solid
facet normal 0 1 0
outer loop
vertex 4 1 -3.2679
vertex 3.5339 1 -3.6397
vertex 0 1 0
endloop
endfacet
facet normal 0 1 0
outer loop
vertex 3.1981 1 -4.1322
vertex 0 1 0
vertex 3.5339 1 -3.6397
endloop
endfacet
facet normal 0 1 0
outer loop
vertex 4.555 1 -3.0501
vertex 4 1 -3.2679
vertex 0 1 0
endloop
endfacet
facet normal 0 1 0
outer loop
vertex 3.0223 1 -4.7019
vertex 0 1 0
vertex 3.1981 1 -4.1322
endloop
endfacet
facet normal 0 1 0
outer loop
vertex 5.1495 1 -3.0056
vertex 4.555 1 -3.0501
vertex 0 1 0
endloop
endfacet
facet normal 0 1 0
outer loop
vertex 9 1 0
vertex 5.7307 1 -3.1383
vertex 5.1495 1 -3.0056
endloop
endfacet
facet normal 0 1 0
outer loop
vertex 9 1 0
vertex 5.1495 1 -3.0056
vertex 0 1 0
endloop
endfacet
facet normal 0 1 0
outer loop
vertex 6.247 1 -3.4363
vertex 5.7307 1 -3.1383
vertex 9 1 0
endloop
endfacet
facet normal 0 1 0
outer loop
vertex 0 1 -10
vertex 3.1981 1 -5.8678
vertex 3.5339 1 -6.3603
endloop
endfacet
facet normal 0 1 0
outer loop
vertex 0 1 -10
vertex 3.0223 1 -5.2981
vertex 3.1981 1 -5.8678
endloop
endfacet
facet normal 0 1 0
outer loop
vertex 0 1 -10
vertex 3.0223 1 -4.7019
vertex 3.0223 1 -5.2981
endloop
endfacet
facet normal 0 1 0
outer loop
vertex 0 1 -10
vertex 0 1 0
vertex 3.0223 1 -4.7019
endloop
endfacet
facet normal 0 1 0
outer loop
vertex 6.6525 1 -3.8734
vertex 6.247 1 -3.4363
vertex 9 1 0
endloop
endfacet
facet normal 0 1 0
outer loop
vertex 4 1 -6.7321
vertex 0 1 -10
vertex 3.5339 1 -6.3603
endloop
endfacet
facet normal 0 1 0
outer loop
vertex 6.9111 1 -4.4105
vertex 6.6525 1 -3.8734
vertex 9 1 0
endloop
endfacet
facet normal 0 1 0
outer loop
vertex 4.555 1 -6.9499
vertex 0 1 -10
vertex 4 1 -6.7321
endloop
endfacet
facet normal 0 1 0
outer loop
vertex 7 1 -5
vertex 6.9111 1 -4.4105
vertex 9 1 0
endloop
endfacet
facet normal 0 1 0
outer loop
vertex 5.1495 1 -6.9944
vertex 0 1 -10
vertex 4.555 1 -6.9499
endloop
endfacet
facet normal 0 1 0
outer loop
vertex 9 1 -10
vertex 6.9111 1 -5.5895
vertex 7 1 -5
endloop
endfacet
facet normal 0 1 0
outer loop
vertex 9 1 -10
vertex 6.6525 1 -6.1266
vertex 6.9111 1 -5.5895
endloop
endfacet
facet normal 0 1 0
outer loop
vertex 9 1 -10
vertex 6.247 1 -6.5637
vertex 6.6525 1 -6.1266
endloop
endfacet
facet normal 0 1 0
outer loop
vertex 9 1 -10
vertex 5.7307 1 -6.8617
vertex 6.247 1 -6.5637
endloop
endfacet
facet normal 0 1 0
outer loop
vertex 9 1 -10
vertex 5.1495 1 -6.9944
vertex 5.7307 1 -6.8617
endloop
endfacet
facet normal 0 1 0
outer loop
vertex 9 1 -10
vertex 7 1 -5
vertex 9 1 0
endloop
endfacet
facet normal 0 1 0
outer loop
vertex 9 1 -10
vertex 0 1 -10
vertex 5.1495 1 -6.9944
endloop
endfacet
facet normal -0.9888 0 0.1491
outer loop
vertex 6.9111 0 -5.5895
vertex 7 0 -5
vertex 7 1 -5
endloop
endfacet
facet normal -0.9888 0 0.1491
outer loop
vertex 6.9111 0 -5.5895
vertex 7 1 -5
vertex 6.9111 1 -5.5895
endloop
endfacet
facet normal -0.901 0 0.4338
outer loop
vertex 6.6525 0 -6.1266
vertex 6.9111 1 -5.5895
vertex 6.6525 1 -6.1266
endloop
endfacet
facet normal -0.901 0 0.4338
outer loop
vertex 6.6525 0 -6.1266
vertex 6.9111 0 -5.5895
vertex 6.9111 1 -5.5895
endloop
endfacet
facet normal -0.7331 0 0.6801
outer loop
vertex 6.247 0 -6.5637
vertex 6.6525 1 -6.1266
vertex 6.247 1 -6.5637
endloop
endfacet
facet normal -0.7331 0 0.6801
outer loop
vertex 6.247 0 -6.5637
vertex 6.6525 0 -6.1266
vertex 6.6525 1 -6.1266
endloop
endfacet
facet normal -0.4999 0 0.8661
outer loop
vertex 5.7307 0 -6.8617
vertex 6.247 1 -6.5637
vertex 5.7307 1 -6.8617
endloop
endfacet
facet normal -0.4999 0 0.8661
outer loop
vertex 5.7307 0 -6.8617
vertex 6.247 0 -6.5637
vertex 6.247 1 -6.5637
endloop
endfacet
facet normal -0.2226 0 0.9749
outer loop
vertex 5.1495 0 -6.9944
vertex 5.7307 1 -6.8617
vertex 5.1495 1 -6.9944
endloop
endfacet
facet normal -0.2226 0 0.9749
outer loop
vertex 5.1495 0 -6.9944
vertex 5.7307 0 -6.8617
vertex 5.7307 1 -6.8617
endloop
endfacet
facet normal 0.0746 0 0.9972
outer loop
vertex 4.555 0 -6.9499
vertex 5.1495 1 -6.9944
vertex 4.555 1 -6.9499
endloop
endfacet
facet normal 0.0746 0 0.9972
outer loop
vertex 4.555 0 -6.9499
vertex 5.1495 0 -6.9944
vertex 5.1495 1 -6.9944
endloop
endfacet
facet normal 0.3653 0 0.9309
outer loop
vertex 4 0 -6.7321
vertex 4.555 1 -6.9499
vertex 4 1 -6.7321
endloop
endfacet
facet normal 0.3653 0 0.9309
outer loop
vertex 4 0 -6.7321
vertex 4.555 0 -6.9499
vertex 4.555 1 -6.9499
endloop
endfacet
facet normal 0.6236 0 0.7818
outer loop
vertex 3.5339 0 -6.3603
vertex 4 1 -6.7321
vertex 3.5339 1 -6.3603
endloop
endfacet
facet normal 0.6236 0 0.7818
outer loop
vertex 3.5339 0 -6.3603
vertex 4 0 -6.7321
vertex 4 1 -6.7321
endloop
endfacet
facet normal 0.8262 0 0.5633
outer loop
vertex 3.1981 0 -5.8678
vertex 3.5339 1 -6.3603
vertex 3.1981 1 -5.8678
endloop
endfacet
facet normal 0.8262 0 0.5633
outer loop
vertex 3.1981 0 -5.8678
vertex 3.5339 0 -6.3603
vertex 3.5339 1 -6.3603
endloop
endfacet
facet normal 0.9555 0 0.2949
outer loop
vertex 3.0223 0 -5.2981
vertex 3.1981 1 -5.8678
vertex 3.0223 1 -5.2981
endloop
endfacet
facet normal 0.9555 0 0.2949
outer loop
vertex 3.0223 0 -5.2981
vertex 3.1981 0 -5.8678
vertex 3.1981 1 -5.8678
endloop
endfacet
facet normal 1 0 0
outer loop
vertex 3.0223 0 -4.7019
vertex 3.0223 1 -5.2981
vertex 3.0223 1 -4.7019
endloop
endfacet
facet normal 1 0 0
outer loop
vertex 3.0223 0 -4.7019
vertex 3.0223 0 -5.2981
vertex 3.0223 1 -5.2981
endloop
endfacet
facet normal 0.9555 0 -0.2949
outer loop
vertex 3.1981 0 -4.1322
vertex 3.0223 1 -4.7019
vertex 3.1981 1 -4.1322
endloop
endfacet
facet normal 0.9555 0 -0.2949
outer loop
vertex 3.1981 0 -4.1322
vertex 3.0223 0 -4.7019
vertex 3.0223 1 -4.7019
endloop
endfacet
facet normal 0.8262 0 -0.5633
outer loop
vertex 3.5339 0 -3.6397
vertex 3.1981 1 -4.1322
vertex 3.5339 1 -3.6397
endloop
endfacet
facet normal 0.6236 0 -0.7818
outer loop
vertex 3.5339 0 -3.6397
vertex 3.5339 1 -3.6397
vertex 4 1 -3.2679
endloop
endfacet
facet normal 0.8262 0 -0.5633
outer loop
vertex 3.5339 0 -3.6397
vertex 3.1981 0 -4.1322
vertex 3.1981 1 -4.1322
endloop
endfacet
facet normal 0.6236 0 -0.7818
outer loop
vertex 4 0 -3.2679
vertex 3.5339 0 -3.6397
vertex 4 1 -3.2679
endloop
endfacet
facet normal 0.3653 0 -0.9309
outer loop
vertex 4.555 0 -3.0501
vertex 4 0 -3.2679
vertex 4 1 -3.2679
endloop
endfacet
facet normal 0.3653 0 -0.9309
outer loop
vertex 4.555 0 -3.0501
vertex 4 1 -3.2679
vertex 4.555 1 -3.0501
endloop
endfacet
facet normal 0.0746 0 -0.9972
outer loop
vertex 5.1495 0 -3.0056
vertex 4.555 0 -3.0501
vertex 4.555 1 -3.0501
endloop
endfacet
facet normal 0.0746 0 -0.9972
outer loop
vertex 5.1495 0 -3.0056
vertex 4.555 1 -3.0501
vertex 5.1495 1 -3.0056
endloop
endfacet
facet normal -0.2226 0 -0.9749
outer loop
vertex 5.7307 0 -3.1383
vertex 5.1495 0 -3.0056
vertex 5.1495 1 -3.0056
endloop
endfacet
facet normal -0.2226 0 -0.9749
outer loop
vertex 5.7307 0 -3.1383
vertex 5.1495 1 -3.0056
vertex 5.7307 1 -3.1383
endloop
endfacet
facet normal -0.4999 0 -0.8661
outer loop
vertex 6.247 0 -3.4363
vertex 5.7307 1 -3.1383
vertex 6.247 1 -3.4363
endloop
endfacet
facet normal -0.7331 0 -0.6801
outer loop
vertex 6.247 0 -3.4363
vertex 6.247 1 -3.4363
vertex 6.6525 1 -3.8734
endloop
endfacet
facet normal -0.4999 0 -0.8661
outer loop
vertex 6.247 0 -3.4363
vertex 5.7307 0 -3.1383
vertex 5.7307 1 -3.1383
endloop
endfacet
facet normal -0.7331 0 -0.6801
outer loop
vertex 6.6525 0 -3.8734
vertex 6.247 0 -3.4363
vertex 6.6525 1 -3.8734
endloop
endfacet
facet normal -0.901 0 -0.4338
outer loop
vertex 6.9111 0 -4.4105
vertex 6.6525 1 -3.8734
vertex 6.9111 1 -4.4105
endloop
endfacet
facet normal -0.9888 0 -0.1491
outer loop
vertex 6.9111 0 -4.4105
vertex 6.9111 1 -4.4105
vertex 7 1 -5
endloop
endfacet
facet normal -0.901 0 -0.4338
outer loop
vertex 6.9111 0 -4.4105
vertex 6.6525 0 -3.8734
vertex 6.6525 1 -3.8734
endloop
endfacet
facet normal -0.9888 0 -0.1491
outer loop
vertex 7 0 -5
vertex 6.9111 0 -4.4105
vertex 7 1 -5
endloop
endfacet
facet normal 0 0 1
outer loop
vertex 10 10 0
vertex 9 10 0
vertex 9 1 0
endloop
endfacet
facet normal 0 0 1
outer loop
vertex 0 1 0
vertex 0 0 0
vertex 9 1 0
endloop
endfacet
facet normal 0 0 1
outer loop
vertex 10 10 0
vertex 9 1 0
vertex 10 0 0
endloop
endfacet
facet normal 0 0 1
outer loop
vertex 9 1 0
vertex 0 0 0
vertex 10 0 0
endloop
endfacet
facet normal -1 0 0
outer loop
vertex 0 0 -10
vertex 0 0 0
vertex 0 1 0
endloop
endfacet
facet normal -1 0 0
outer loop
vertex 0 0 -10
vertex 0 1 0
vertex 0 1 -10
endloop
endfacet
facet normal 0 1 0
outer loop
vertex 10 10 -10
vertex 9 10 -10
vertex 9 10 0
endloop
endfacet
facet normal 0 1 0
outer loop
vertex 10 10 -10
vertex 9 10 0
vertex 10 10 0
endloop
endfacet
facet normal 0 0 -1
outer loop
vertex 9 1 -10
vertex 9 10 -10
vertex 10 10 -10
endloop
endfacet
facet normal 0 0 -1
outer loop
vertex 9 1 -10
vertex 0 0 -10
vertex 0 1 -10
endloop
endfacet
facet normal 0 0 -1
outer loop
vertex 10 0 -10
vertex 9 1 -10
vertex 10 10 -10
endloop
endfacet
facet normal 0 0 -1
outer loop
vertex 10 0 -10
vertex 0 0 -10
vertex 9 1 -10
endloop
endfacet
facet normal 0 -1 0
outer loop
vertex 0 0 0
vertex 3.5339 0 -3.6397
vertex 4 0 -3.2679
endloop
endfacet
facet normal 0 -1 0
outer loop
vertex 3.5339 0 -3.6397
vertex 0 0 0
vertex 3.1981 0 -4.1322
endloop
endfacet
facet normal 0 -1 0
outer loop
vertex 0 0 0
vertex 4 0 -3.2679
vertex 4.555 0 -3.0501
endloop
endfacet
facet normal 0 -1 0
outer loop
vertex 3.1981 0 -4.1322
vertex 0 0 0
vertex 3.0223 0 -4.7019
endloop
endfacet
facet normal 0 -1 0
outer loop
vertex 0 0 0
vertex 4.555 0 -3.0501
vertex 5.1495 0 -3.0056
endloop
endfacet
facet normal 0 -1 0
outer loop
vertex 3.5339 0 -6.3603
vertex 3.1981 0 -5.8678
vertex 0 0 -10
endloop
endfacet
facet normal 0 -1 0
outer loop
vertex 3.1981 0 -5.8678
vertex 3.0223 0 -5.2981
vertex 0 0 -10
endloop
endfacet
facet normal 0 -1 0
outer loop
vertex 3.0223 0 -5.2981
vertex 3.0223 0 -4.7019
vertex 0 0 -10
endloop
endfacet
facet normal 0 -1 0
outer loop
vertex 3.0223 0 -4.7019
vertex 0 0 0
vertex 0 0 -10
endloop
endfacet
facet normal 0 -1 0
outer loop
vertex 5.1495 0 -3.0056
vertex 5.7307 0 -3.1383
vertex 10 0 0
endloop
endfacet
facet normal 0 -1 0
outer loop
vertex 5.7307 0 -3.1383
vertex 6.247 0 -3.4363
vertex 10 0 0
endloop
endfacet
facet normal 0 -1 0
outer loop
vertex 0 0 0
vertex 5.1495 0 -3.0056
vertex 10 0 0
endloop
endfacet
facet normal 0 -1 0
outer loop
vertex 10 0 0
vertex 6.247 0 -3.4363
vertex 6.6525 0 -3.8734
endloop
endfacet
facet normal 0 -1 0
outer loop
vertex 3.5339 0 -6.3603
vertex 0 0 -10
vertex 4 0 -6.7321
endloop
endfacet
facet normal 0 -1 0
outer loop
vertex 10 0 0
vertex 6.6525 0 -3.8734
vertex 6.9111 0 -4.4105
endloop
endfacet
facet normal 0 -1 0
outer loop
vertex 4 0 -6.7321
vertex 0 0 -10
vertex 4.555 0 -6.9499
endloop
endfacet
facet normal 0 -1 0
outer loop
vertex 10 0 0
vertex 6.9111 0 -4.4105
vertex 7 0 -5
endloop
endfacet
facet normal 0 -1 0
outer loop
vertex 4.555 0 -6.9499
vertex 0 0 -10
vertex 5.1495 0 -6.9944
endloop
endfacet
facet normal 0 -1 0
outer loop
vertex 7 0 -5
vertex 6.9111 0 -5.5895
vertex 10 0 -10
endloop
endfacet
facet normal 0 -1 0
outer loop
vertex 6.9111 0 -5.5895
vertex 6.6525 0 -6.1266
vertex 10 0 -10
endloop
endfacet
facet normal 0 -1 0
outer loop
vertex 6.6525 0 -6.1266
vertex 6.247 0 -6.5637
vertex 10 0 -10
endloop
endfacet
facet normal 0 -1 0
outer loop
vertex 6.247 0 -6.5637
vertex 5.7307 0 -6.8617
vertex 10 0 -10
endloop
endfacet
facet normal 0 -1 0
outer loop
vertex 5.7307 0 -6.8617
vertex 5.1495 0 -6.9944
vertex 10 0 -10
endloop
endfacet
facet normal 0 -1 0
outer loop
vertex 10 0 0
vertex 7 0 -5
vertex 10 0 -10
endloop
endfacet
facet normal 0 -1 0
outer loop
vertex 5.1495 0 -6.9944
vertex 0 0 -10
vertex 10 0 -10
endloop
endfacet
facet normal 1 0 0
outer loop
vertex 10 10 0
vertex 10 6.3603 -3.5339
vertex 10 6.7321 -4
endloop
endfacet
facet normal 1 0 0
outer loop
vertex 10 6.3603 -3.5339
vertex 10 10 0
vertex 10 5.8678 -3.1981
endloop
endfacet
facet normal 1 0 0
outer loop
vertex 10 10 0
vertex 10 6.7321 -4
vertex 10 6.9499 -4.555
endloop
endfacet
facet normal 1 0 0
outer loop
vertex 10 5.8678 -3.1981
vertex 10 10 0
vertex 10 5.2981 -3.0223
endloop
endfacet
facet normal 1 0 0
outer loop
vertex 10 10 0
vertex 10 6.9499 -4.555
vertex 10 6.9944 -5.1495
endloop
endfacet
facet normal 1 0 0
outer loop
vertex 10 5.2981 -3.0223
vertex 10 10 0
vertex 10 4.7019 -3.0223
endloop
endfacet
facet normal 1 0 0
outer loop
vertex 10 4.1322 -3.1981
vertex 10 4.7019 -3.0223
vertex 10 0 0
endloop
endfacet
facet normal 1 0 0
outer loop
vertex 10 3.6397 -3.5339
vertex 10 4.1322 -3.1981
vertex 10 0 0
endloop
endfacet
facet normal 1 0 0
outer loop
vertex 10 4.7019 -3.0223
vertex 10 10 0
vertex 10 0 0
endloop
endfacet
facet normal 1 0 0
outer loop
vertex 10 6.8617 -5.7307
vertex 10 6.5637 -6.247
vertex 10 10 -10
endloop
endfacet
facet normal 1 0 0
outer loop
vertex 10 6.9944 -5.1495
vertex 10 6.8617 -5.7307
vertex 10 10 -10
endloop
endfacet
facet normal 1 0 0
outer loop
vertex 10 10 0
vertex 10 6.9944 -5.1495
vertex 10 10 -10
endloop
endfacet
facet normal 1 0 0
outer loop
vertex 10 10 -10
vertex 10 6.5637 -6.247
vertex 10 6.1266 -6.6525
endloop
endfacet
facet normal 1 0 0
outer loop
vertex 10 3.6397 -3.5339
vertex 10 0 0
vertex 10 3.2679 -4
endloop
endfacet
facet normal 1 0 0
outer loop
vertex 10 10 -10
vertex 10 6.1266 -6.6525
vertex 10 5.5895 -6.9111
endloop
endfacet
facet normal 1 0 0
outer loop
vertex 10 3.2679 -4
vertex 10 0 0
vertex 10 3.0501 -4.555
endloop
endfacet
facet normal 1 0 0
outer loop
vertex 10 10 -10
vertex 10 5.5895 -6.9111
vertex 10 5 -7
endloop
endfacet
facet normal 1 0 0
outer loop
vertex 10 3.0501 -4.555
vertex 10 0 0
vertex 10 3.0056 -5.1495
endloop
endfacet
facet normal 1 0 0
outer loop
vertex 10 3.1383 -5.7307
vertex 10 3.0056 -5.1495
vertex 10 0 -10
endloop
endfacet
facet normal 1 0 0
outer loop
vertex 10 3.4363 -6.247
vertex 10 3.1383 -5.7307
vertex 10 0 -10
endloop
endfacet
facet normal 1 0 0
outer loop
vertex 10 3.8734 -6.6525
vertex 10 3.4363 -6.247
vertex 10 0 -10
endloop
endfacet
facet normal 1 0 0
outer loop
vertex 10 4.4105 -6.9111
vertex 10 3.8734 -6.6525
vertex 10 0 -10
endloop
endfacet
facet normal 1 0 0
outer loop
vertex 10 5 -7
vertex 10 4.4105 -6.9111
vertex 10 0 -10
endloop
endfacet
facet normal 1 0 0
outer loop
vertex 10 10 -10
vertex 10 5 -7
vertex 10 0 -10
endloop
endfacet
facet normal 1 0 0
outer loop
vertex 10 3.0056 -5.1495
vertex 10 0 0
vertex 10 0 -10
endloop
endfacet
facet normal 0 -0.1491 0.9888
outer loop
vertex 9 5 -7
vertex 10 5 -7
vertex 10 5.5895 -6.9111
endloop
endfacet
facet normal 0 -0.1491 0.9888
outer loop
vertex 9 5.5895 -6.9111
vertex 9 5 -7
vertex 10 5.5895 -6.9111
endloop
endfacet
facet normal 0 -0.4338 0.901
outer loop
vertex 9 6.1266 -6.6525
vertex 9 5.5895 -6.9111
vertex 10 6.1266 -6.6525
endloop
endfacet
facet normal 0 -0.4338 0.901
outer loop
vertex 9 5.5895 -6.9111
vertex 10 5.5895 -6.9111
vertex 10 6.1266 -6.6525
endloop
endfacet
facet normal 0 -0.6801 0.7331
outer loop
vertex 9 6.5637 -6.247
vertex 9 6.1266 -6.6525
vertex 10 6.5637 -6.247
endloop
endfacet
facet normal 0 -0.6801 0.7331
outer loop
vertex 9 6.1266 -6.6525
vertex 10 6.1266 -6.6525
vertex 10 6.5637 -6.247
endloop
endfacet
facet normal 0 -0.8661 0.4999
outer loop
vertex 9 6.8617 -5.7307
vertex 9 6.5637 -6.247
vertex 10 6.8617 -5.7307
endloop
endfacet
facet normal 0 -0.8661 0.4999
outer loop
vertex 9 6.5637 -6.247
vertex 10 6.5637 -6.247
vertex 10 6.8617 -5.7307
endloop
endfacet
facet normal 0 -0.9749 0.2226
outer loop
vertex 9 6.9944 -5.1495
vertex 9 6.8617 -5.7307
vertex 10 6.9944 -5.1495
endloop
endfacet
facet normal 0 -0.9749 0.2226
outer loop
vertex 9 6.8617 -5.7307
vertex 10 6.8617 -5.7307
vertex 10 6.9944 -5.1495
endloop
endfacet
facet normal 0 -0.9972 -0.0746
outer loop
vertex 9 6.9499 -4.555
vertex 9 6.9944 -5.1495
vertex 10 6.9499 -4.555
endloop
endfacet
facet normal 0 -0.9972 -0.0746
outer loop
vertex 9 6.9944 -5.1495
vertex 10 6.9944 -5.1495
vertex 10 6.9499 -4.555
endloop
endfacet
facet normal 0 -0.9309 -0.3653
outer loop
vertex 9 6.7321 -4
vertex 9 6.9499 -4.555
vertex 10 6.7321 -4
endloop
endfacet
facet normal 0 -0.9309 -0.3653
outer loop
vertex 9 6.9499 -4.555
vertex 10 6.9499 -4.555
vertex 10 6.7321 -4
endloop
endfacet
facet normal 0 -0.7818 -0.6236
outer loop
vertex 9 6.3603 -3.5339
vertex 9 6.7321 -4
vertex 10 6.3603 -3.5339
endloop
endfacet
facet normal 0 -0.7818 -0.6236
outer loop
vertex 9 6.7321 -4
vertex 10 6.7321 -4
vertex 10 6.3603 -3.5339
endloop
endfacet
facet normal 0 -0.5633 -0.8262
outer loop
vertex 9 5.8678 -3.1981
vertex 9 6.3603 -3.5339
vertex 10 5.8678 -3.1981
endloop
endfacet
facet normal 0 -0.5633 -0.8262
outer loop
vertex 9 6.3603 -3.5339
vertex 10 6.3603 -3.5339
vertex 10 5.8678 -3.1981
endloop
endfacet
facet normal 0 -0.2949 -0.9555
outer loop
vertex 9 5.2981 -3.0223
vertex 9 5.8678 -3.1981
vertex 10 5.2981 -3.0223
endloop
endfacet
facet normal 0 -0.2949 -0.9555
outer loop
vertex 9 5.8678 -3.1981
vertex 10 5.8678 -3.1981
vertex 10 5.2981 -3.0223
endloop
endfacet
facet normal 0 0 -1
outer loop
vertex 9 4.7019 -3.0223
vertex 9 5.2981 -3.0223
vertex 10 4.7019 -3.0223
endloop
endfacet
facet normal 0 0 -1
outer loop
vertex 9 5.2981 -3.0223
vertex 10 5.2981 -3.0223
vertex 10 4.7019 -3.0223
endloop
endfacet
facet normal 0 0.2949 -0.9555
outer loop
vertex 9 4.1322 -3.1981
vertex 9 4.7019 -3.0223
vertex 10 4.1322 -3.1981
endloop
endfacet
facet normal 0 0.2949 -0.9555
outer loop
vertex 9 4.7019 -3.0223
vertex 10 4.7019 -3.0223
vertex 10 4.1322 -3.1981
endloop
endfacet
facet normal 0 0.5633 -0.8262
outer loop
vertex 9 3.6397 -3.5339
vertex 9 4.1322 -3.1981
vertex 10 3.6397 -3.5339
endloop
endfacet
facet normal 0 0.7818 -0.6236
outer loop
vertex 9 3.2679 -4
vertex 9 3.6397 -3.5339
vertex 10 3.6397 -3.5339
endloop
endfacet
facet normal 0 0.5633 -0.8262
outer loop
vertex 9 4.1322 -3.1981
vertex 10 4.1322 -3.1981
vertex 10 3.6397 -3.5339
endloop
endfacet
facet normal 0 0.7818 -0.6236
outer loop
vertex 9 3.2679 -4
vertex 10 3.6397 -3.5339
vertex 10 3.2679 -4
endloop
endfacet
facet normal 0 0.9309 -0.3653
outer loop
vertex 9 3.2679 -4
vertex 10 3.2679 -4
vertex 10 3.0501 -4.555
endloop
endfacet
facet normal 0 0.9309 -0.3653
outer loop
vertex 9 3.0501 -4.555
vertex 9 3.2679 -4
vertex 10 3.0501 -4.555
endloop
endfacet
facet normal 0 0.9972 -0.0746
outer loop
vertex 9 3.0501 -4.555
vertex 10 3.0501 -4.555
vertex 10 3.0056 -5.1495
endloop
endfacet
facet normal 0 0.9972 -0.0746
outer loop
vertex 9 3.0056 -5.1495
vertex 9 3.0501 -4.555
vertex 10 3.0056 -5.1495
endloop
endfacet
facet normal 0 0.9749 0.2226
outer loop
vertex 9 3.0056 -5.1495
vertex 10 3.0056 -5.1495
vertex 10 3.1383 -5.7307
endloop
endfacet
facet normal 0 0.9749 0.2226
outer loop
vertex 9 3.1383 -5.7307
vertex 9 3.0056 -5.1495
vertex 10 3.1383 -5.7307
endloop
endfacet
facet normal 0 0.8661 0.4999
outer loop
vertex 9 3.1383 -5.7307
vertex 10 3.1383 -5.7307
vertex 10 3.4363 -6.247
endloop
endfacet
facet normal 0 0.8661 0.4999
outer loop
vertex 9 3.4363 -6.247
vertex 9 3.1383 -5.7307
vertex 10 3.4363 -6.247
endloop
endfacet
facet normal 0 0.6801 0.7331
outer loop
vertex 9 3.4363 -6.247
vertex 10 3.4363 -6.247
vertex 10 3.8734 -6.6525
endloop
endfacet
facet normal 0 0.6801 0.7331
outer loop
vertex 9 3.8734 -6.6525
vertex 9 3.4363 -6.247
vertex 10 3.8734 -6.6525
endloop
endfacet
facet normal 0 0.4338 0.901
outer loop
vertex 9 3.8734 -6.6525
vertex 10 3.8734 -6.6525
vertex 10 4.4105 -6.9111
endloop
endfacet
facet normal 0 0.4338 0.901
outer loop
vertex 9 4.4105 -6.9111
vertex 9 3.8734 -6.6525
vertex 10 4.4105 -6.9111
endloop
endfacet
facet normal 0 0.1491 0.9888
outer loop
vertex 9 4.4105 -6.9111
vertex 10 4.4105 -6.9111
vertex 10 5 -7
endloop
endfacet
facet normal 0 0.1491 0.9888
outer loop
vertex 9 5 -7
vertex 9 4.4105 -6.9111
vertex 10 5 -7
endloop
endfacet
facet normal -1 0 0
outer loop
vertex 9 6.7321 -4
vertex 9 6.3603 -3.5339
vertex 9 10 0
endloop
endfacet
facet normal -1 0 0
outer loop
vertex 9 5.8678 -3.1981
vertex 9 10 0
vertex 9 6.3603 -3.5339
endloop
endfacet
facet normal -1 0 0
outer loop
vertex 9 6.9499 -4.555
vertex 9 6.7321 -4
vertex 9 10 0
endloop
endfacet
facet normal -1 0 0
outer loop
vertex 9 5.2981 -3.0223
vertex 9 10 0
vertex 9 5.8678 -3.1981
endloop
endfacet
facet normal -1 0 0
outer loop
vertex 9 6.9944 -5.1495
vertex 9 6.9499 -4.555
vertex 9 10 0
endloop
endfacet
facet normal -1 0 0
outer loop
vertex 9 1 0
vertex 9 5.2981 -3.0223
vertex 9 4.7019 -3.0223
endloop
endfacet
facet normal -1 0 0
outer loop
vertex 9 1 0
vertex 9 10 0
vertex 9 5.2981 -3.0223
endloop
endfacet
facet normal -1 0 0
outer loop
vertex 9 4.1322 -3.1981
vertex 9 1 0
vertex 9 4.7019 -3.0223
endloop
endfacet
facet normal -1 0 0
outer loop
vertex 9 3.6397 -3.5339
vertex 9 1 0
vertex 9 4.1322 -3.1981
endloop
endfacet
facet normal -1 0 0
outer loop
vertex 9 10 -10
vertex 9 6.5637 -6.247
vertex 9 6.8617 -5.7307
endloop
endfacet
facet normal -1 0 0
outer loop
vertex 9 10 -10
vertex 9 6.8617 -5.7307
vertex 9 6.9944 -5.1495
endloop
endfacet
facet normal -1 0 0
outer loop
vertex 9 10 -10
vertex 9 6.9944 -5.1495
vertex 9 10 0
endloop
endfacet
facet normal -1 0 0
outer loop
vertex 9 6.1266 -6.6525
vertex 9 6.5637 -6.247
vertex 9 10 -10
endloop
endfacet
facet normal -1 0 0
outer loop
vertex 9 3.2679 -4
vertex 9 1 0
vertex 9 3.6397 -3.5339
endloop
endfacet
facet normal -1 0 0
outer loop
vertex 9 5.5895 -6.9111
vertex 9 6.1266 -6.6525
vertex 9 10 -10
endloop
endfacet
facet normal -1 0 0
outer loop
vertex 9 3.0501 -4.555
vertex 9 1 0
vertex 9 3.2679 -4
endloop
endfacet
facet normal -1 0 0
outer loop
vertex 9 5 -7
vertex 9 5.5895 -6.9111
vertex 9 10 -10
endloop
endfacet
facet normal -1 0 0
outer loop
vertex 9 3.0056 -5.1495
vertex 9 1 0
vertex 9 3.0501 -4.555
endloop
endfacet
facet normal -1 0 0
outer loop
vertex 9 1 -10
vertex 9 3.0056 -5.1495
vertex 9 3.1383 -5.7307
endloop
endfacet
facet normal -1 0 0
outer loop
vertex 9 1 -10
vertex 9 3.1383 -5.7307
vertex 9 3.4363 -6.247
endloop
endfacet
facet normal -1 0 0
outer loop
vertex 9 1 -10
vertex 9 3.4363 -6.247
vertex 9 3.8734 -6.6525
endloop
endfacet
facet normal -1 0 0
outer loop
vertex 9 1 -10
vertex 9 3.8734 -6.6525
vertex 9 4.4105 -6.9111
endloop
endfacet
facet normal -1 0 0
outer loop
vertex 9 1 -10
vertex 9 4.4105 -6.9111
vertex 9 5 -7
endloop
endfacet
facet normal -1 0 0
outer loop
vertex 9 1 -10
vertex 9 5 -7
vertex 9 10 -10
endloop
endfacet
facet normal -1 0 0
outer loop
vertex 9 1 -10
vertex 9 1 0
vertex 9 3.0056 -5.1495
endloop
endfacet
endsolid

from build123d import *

# Parameters (mm, degrees)
ESQUISSE1_W      = 10
ESQUISSE1_H      = 10
ESQUISSE1_R      = 2
EXTRUSION1_DEPTH = 1
ESQUISSE2_W      = 1
ESQUISSE2_H      = 10
EXTRUSION2_DEPTH = 9
EXTRUSION3_REACH = 12
ESQUISSE3_R      = 2


with BuildPart() as part:
    # Esquisse1 → Extrusion1 (new body)
    with BuildSketch(Plane(origin=(0, 0, 0), x_dir=(1, 0, 0), z_dir=(0, 1, 0))):
        with Locations((5, 5)):
            Rectangle(ESQUISSE1_W, ESQUISSE1_H)
        with Locations((5, 5)):
            Circle(ESQUISSE1_R, mode=Mode.SUBTRACT)
    extrude(amount=EXTRUSION1_DEPTH)

    # Esquisse2 → Extrusion2 (add)
    with BuildSketch(Plane(origin=(0, 1, 0), x_dir=(1, 0, 0), z_dir=(0, 1, 0))):
        with Locations((9.5, 5)):
            Rectangle(ESQUISSE2_W, ESQUISSE2_H)
    extrude(amount=EXTRUSION2_DEPTH)

    # Esquisse3 → Extrusion3 (cut, up to next)
    with BuildSketch(Plane(origin=(10, 0, 0), x_dir=(0, 0, -1), z_dir=(1, 0, 0)), mode=Mode.PRIVATE) as extrusion3_sk1:
        with Locations((5, 5)):
            Circle(ESQUISSE3_R)
    extrusion3_tool1 = extrude(extrusion3_sk1.sketch, amount=-EXTRUSION3_REACH, mode=Mode.PRIVATE) & part.part
    add(extrusion3_tool1.solids().sort_by_distance((10, 5, -5))[0], mode=Mode.SUBTRACT)


solid = part.part
